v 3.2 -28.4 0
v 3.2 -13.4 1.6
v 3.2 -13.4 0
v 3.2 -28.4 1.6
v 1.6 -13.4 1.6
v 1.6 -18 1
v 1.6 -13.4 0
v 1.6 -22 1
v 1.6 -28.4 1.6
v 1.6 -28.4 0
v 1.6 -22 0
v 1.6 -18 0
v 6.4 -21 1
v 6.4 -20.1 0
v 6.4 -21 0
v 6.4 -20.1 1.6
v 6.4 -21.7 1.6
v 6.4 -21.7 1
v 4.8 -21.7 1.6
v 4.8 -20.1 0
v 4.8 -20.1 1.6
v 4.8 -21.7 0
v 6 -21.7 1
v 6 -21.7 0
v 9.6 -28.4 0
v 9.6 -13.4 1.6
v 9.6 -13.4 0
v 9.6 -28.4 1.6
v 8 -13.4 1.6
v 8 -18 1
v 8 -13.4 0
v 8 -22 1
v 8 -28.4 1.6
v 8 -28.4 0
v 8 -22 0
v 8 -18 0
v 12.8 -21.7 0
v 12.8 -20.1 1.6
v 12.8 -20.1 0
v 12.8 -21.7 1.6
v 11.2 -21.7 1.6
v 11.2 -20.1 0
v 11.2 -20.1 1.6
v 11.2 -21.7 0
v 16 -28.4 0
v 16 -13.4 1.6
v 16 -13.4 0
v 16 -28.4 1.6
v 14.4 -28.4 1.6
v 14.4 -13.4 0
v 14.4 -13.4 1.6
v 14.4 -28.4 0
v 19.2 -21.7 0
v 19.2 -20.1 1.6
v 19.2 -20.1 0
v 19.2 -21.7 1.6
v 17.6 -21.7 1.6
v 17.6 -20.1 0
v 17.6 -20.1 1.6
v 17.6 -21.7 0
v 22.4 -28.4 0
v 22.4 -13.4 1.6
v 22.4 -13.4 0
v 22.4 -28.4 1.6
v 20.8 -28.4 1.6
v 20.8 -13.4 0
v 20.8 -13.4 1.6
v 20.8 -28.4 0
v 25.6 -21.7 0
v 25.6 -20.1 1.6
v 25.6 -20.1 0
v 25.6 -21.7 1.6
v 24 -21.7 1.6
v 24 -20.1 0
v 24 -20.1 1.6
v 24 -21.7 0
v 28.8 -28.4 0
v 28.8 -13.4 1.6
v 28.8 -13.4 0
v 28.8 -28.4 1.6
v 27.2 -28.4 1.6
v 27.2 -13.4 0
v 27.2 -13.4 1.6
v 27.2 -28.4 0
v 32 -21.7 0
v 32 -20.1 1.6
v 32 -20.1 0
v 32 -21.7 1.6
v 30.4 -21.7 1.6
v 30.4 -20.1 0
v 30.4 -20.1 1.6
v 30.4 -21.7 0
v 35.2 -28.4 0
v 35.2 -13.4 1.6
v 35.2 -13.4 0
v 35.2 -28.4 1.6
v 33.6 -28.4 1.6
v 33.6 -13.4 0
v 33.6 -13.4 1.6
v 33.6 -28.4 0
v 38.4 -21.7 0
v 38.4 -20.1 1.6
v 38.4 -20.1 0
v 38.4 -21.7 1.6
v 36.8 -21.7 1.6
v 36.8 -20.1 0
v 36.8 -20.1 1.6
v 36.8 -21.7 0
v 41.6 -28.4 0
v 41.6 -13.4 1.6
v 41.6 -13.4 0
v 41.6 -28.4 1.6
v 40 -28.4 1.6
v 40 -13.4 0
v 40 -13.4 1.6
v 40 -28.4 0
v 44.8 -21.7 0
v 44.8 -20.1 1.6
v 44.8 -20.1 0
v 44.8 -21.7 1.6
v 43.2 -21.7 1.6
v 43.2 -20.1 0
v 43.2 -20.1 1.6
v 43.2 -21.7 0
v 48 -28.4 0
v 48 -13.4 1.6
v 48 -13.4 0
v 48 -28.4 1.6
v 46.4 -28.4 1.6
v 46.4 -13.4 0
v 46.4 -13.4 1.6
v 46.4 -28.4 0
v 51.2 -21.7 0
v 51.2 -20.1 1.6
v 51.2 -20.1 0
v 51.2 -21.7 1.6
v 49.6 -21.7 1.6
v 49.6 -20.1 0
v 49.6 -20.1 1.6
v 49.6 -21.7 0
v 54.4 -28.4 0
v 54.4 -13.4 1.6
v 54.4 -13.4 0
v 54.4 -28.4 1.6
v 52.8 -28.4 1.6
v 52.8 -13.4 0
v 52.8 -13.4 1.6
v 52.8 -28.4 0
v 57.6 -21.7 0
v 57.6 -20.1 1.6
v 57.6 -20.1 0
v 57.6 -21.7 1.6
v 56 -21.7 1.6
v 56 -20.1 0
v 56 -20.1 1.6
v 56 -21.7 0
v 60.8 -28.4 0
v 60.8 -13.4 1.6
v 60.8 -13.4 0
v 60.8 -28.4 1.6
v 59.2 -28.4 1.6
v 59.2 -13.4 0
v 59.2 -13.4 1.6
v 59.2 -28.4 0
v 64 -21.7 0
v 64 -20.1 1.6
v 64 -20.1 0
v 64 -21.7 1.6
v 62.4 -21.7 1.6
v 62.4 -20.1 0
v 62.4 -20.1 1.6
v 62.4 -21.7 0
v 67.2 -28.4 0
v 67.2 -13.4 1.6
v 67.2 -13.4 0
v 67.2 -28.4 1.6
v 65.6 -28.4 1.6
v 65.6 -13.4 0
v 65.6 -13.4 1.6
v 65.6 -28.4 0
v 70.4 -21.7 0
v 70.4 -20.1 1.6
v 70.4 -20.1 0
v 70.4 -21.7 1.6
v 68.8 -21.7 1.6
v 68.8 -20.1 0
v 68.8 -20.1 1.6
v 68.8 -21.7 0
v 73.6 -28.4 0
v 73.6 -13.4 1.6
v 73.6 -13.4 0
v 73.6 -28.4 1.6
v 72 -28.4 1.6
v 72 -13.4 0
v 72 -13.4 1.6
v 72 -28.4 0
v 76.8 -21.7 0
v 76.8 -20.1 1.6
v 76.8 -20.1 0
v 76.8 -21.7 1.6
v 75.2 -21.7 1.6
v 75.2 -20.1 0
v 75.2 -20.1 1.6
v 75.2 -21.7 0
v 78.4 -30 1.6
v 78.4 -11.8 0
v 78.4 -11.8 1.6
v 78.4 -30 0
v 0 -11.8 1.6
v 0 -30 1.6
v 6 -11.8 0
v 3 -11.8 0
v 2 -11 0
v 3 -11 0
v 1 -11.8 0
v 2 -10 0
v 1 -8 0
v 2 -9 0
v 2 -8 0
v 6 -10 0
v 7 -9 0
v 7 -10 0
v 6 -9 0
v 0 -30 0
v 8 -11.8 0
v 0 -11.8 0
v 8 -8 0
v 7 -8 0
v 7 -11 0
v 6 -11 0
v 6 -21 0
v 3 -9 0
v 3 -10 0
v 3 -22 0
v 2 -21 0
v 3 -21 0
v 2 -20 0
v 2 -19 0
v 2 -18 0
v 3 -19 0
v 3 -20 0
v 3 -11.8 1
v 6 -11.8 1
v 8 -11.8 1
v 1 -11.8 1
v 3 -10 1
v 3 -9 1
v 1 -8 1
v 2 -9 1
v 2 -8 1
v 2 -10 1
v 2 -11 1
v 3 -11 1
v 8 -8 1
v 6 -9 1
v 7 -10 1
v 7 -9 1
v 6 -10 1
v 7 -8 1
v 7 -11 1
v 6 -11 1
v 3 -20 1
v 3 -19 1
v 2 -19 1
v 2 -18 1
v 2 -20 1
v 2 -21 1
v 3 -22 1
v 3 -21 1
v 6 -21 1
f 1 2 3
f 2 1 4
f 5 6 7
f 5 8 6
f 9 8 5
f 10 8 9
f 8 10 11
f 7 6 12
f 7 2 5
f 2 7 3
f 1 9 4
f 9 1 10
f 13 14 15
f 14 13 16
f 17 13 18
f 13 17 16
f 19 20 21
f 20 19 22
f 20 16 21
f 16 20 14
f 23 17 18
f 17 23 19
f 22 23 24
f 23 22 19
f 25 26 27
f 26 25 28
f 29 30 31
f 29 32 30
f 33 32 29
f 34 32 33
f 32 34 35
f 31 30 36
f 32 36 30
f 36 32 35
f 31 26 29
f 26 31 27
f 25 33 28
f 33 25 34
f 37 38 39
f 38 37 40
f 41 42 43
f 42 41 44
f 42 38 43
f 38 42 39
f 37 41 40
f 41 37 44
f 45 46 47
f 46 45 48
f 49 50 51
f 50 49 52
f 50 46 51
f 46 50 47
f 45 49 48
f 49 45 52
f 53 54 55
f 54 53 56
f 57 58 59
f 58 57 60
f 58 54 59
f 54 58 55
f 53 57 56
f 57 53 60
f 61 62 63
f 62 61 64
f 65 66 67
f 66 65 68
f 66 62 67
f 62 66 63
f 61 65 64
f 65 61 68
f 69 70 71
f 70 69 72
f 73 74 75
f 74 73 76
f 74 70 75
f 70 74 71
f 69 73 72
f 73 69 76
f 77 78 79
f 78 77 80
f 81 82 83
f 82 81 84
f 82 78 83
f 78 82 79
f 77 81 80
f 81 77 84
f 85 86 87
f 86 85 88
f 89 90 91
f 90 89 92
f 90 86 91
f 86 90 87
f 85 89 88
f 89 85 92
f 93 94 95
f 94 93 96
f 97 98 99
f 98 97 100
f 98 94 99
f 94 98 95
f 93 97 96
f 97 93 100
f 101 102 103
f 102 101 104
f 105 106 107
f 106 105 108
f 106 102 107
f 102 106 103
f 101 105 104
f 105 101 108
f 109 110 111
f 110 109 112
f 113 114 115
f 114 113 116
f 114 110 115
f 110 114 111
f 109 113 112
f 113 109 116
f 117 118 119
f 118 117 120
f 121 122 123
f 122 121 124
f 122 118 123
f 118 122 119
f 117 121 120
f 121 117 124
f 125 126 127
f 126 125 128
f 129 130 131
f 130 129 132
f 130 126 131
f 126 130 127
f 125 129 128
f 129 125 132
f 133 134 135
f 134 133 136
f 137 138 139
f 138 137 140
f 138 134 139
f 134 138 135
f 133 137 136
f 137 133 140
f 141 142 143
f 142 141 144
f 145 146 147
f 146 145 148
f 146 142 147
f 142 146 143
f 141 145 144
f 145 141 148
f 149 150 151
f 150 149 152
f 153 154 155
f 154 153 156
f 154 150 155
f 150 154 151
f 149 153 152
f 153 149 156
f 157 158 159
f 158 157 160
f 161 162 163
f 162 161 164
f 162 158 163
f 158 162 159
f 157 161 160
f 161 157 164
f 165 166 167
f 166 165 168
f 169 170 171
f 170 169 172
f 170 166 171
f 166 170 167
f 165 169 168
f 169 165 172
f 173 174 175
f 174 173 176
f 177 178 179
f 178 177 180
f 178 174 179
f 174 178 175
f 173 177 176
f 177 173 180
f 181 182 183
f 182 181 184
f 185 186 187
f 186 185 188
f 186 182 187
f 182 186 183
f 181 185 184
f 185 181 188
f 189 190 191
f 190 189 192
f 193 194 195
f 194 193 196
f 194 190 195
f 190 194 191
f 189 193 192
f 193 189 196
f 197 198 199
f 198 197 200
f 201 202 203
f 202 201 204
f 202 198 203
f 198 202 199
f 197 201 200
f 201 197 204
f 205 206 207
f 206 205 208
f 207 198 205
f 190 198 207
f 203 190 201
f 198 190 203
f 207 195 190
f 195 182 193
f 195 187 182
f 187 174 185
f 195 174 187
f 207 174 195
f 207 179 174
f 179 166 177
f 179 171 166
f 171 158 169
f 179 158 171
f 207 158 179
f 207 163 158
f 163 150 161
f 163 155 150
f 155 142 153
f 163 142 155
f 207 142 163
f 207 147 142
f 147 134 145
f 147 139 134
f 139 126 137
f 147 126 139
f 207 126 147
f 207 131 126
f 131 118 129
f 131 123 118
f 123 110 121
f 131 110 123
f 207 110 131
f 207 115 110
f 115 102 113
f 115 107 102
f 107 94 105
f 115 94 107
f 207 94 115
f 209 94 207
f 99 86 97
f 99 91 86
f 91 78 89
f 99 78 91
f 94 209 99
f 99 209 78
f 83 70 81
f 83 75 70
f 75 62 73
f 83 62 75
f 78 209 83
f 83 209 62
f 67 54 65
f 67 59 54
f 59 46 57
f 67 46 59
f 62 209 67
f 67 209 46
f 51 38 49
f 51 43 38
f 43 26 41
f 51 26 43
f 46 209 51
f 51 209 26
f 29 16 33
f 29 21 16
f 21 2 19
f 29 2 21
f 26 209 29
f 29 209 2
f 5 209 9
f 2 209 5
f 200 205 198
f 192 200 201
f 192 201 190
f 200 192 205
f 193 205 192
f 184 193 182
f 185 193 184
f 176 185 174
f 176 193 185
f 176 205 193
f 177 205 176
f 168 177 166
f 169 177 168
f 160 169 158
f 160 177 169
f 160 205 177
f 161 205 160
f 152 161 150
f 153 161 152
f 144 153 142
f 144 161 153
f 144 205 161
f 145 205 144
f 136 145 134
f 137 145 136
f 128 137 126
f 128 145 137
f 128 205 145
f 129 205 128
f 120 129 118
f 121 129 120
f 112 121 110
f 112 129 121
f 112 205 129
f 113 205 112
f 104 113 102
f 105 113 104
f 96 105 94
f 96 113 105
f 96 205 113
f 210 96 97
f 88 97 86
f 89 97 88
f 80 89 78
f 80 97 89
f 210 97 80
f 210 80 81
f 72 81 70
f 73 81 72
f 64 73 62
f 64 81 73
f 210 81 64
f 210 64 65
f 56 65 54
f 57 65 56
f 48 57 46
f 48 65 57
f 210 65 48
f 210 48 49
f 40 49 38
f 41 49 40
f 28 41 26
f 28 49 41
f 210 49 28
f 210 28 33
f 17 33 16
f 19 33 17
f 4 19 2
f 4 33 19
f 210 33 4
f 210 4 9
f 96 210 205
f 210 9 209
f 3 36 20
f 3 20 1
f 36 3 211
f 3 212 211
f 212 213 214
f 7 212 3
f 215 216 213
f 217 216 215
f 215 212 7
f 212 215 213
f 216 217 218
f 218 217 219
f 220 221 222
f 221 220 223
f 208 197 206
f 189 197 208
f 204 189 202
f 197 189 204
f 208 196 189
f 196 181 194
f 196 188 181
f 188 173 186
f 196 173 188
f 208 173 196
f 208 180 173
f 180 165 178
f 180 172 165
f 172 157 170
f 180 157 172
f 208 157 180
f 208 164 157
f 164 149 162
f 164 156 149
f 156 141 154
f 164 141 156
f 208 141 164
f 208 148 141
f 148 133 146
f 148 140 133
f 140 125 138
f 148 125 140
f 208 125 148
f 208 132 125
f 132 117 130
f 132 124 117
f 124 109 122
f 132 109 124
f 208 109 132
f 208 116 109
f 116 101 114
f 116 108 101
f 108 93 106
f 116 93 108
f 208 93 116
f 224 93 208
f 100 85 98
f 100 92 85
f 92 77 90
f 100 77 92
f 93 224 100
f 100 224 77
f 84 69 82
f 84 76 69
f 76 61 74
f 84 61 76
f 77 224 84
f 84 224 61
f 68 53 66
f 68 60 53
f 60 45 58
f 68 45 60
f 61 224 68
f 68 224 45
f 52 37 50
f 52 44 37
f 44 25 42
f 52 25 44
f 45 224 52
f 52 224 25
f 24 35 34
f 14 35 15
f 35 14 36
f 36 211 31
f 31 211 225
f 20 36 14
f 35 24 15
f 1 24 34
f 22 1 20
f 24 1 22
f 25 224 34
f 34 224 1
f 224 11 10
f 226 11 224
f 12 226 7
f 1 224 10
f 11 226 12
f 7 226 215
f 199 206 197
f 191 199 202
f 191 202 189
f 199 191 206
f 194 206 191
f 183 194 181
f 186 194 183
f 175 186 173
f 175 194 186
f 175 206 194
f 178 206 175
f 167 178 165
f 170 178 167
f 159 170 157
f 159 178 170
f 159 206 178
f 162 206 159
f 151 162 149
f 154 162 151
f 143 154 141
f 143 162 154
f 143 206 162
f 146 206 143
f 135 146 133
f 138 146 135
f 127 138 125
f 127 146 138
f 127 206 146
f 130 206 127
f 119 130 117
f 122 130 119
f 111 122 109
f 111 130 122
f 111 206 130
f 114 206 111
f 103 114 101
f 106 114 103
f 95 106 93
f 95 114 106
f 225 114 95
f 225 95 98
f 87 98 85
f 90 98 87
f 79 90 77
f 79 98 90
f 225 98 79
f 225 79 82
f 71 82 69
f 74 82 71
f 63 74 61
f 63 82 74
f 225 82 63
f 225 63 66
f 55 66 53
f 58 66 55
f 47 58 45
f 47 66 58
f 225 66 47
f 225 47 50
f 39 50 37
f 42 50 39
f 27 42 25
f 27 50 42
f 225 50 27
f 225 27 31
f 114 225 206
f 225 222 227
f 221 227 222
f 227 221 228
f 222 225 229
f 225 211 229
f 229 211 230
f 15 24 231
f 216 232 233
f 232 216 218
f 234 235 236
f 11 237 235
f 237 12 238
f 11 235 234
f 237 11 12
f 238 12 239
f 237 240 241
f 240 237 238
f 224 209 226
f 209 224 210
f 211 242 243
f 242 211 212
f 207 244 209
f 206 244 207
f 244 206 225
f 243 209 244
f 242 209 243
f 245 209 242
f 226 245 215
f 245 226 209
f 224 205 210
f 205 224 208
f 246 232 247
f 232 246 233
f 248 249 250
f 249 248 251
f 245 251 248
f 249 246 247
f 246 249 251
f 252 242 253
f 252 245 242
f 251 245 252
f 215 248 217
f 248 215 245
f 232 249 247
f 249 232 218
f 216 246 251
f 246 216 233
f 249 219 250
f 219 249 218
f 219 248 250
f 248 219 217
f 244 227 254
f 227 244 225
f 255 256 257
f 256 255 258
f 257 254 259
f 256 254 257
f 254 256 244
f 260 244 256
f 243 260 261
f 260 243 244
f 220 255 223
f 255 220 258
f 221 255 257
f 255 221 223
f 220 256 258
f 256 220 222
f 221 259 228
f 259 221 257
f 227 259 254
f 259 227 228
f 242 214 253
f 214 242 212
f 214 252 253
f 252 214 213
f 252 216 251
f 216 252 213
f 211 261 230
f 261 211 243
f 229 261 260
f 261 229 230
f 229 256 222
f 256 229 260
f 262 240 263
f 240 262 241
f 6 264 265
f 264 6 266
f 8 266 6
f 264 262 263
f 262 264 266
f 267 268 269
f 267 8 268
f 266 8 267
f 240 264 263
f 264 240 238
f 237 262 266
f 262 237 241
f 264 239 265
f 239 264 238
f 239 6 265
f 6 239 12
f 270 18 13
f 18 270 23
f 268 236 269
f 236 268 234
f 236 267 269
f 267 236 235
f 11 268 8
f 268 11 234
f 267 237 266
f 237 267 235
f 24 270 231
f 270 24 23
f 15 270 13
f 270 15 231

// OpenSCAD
// file: myBaseParts.scad
// Copyright Stephen Morrisson 2017
// All rights reserved

// {xyz, trans, rot} UBar


use <myCube.scad>
use <myCylinder.scad>



module xyzUBar(cB, cL, cR, xBase, yBase, zBase, 
    xLeft, zLeft, xRight, zRight)
{
    xyzCube(cB, xBase, yBase, zBase);
    transCube(cL, 0, 0, zBase, xLeft, yBase, zLeft);
    transCube(cR, xBase - xRight, 0, zBase, xRight, yBase, zRight);
}

xyzUBar("red", "green", "blue", 10, 14, 1, 2, 3, 4, 5);

module transUBar(c, xO, yO, zO, xB, yB, zB, xL, zL, xR, zR)
{
    translate([xO, yO, zO]) xyzUBar(c, c, c, xB, yB, zB, xL, zL, xR, zR);
}
//transUBar("orange", -10, -10, -1,  4, 2, 1, 1, 1, 2, 2);


module rotUBar(c, rotX, rotY, rotZ, xO, yO, zO,
    xB, yB, zB, xL, zL, xR, zR)
{
    rotate([rotX, rotY, rotZ]) transUBar(c, xO, yO, zO, xB, yB, zB,
        xL, zL, xR, zR);
}
rotUBar("orange", 90, 180, 270, -10, -10, -1,  4, 2, 1, 1, 1, 2, 2);
// file: Flang.scad
// Copyright Stephen Morrisson 2017
// All rights reserved

// Tab Flang

use <myCube.scad>
use <myCylinder.scad>

module rightSimpleTab(c, rRadius, z, xSpacer)
{
    yD = 2.0 * rRadius;
    xyzCube(c, xSpacer, yD, z);
    rightHalfCylinder(c, xSpacer, 0, 0, rRadius, z);
}

module rightTab(c, xO, yO, zO, rRadius, z, xSpacer)
{
    translate([xO, yO, zO])
    {
        rightSimpleTab(c, rRadius, z, xSpacer);
    }
}
rightTab("blue", 10, 0, 0, 3, 1, 4);

module rightFlang(c, xO, yO, zO, rRadius, z, xSpacer, rHole)
{
    rMid = rRadius - rHole;
    difference()
    {
        rightTab(c, xO, yO, zO, rRadius, z, xSpacer);
        transCylinder(c, xO + xSpacer - rRadius, yO + rMid, zO -1,
            rHole, z + 2.0); 
    }
}
rightFlang("green", 20,0,0, 3, 1, 4, 2);

module leftTab(c, xO, yO, zO, rRadius, z, xSpacer)
{
    mirror([1, 0, 0]) rightTab(c, -xO, yO, zO, rRadius, z, xSpacer);
}
leftTab("blue", -10,0,0, 3, 1, 4);

module leftFlang(c, xO, yO, zO, rRadius, z, xSpacer, rHole)
{
    mirror([1, 0, 0])
        rightFlang(c, -xO, yO, zO, rRadius, z, xSpacer, rHole);
}
leftFlang("green", -20,0,0, 3, 1, 4, 1);
// file: LoomFrame1.scad
// Copyright Stephen Morrisson 2017
// All rights reserved

//  Loom Frame

use <myCube.scad>
use <Flang.scad>
use <myBaseParts.scad>

module LoomFrame1(c, xO, yO, zO, y)
{
    transCenterUpright("green", xO, yO, zO, y);
}
//LoomFrame1("red", 0,0,0,  12);

module transLeftHangerSupport(c, xO, yO, zO)
{
    translate([xO, yO, zO])
    {
        transCube(c, 0, 0, 0, 2.0, 1, 1);
        transCube(c, 0, 1, 0, 1, 1, 1);
    }
}
module transRightHangerSupport(c, xO, yO, zO)
{
    translate([xO, yO, zO])
    {
        //transCube("red", 0,0,0, 1,1,1);
        transCube(c, 0, 0, 0, 2.0, 1, 1);
        transCube(c, 1, 1, 0, 1, 1, 1);
    }
}

module CenterUpright(c, yB)
{
    transLeftHangerSupport(c, 0, 0, 0);
    transRightHangerSupport(c, 5, 0,0);
    
    transLeftHangerSupport(c, 0, yB - 2, 0);
    transRightHangerSupport(c, 5, yB - 2,0);
    
    transUBar(c, 2, 0, 0, 3, yB, 1, 1, 1, 1, 1);
} 

module transCenterUpright(c, xO, yO, zO, yB)
{
    translate([xO,yO,zO]) CenterUpright(c, yB);
}

scale([3, 3, 1])
scale([1.6,1.6,1.6]) transCenterUpright("green", -5,0,0, 12);
//transCenterUpright("blue", 0,0,0, 12);
// file: RigidHeddleShed.scad
// Copyright Stephen Morrisson 2017
// All rights reserved

use <myCube.scad>
use <myCylinder.scad>

// rigid heddle Shed

// A and B are slots (or wholes for ridit heddle
// count is the number of A
// One b for each A
module ShedAB(c, xBoarder, yBoarder, z, xA, yA, xB, yB, xSpacer, count)
{
    yMaxOpening = max(yA, yB);
    zBig = z * 3;
    
    xAB = xA + xB + xSpacer + xSpacer;
    xSize = xBoarder * 2.0 + count * xAB - xSpacer;
    ySize = yBoarder * 2.0 + yMaxOpening;
    
    yAOffset = yBoarder + ((yMaxOpening - yA) / 2.0);
    yBOffset = yBoarder + ((yMaxOpening - yB) / 2.0);
    
    difference()
    {
        xyzCube(c, xSize, ySize, z);
        {
            iCount = count - 1;
            for (i = [0: iCount])
            {
                xAO = xBoarder + (i * xAB);
                transCube(c, xAO, yAOffset, -z, xA, yA, zBig);
                xBO = xAO + xA + xSpacer;
                transCube(c, xBO, yBOffset, -z, xB, yB, zBig);  
            }
        }
    }
}
//ShedAB("green", 3, 3, 1, 1.6, 10, 1.6, 16, 1.6, 2);
//translate([-3,0,0]) ShedAB("green", 3, 3, 1, 2, 10, 3, 4, 1, 3);

module SimpleRigidShed(c, aBoarder, z, aOpenings, yA, count)
{
    //xyzCube("red", 1,1,1);
    a = aOpenings;
    ShedAB(c, aBoarder, aBoarder, z, a, yA, a, a, a, count); 
}
//SimpleRigidShed("blue", 1.6, 1.6, 1.6, 16.0, 20);

module transSimpleRigidShed(c, xO, yO, zO, aBoarder, z, aOpenings, yA, count)
{
    translate([xO, yO, zO])
        SimpleRigidShed(c, aBoarder, z, aOpenings, yA, count);
}
transSimpleRigidShed("red", 2,-50,4, 1.6, 1.6, 1.6, 16.0, 20);

// count must be even.
module transSimpleShed(c, xO, yO, zO, aBoarder, z, xHole, yHole, count)
{
    translate([xO, yO, zO])
    {
        ShedAB(c, aBoarder, aBoarder, z,
            xHole, yHole, xHole, yHole, xHole, count / 2);
    }
}
transSimpleShed("green", 2,-30,4, 1.6, 1.6, 1.6, 16.0, 20);
// file: myCylinder.scad
// Copyright Stephen Morrisson 2017
// All rights reserved

// rh Cent Cylinder
// rh Cylinder
use <myCube.scad>

module rhCentCylinder(c, rRadius, z)
{
    color(c) cylinder(h=z, r=rRadius, center=false);
}
translate([-15, -15, 0]) rhCentCylinder("red", 3, 2);

module rhCylinder(c, rRadius, z)
{
    translate([rRadius, rRadius, 0]) rhCentCylinder(c, rRadius, z);
}
translate([-15, 15, 0]) rhCylinder("blue", 2, 3);

module transCylinder(c, xO, yO, zO, rRadius, z)
{
    translate([xO, yO, zO]) rhCylinder(c, rRadius, z);
}
//transCylinder("red", 0,0,0, 4, 1);
transCylinder("green", 15, 15, 0, 2, 2);

module centRightCylinder(c, rRadius, z)
{
    rD = rRadius * 3.0;
    difference()
    {
        rhCentCylinder(c, rRadius, z);
        transCube(c, -rD, -rRadius, -rRadius,  rD, rD, rD);
    }
}
centRightCylinder("green", 2, 2);

module rightHalfCylinder(c, xO, yO, zO, rRadius, z)
{
    translate([xO, yO + rRadius, zO]) centRightCylinder(c, rRadius, z);
}
rightHalfCylinder("yellow", 10, 0, 0, 2, 1);

module leftHalfCylinder(c, xO, yO, zO, rRadius, z)
{
    translate([xO + rRadius, yO + rRadius, zO])
        rotate([0,0,180]) centRightCylinder(c, rRadius, z);
}
leftHalfCylinder("yellow", -10, 0, 0, 2, 1);

module topHalfCylinder(c, xO, yO, zO, rRadius, z)
{
    translate([xO + rRadius, yO, zO])
        rotate([0,0,90]) centRightCylinder(c, rRadius, z);
}
topHalfCylinder("yellow", 0, 10, 0, 2, 1);

module bottomHalfCylinder(c, xO, yO, zO, rRadius, z)
{
    translate([xO + rRadius, yO + rRadius, zO])
        rotate([0,0,270]) centRightCylinder(c, rRadius, z);
}
bottomHalfCylinder("yellow", 0, -10, 0, 2, 1);
// file: myCube.scad
// Copyright Stephen Morrisson 2017
// All rights reserved

// {xyz, rot, trans, tr} Cube

module xyzCube(c, x, y, z)
{
    color(c) cube([x, y, z], false);
}

module rotCube(c, rotX, rotY, rotZ, x, y, z)
{
    rotate([rotX, rotY, rotZ]) xyzCube(c, x, y, z);
}
translate([-15, 15, 0,])rotCube("green", 45, 45, 45, 2,2,2);

module transCube(c, xOffset, yOffset, zOffset, x, y, z)
{
    translate([xOffset, yOffset, zOffset]) xyzCube(c, x, y, z);
}
transCube("brown", -15, -15, 0, 3, 2, 1);


module trCube(c, rotX, rotY, rotZ, xO, yO, zO, x, y, z)
{
    translate([xO, yO, zO])
    rotate([rotX, rotY, rotZ])
    xyzCube(c, x, y, z);
}
//trCube("yellow", 0,0,0, 0,0,0, 2, 3, 4);
//trCube("green", 45, 45, 45, 4, 3, 1, 5, 6, 7);
//trCube("blue", 0, 0, 45, 20, 0, 0, 5, 6, 7);
trCube("orange", 0,0,0, -10, 0, 0, 1,1,1);
//trCube("orange", 45,0,0, -15, 0, 0, 1,1,1);
//trCube("orange", 0,45,0, -20, 0, 0, 1,1,1);
//trCube("orange", 0,0,45, -25, 0, 0, 1,1,1);
// main file
// Copyright Stephen Morrisson 2017
// All rights reserved

use <myCube.scad>
use <myCylinder.scad>
use <RigidHeddleShed.scad>
use <LoomFrame1.scad>


module RigidHeddleLoom()
{
    aS = 1.6;
    
    yShed = 15.0;
    
   // rigid heddle shed
    transSimpleRigidShed("green", 0,-30,0, 1.6, 1.6, 1.6, yShed, 12); 
    
    transCenterUpright("green", 1, -10,0,0, yShed * 2);
    transCenterUpright("green", 1, -20,0,0, yShed * 2);
}
RigidHeddleLoom();





// heddle support



// frame
//rhCentCylinder("red", 3, 2);
